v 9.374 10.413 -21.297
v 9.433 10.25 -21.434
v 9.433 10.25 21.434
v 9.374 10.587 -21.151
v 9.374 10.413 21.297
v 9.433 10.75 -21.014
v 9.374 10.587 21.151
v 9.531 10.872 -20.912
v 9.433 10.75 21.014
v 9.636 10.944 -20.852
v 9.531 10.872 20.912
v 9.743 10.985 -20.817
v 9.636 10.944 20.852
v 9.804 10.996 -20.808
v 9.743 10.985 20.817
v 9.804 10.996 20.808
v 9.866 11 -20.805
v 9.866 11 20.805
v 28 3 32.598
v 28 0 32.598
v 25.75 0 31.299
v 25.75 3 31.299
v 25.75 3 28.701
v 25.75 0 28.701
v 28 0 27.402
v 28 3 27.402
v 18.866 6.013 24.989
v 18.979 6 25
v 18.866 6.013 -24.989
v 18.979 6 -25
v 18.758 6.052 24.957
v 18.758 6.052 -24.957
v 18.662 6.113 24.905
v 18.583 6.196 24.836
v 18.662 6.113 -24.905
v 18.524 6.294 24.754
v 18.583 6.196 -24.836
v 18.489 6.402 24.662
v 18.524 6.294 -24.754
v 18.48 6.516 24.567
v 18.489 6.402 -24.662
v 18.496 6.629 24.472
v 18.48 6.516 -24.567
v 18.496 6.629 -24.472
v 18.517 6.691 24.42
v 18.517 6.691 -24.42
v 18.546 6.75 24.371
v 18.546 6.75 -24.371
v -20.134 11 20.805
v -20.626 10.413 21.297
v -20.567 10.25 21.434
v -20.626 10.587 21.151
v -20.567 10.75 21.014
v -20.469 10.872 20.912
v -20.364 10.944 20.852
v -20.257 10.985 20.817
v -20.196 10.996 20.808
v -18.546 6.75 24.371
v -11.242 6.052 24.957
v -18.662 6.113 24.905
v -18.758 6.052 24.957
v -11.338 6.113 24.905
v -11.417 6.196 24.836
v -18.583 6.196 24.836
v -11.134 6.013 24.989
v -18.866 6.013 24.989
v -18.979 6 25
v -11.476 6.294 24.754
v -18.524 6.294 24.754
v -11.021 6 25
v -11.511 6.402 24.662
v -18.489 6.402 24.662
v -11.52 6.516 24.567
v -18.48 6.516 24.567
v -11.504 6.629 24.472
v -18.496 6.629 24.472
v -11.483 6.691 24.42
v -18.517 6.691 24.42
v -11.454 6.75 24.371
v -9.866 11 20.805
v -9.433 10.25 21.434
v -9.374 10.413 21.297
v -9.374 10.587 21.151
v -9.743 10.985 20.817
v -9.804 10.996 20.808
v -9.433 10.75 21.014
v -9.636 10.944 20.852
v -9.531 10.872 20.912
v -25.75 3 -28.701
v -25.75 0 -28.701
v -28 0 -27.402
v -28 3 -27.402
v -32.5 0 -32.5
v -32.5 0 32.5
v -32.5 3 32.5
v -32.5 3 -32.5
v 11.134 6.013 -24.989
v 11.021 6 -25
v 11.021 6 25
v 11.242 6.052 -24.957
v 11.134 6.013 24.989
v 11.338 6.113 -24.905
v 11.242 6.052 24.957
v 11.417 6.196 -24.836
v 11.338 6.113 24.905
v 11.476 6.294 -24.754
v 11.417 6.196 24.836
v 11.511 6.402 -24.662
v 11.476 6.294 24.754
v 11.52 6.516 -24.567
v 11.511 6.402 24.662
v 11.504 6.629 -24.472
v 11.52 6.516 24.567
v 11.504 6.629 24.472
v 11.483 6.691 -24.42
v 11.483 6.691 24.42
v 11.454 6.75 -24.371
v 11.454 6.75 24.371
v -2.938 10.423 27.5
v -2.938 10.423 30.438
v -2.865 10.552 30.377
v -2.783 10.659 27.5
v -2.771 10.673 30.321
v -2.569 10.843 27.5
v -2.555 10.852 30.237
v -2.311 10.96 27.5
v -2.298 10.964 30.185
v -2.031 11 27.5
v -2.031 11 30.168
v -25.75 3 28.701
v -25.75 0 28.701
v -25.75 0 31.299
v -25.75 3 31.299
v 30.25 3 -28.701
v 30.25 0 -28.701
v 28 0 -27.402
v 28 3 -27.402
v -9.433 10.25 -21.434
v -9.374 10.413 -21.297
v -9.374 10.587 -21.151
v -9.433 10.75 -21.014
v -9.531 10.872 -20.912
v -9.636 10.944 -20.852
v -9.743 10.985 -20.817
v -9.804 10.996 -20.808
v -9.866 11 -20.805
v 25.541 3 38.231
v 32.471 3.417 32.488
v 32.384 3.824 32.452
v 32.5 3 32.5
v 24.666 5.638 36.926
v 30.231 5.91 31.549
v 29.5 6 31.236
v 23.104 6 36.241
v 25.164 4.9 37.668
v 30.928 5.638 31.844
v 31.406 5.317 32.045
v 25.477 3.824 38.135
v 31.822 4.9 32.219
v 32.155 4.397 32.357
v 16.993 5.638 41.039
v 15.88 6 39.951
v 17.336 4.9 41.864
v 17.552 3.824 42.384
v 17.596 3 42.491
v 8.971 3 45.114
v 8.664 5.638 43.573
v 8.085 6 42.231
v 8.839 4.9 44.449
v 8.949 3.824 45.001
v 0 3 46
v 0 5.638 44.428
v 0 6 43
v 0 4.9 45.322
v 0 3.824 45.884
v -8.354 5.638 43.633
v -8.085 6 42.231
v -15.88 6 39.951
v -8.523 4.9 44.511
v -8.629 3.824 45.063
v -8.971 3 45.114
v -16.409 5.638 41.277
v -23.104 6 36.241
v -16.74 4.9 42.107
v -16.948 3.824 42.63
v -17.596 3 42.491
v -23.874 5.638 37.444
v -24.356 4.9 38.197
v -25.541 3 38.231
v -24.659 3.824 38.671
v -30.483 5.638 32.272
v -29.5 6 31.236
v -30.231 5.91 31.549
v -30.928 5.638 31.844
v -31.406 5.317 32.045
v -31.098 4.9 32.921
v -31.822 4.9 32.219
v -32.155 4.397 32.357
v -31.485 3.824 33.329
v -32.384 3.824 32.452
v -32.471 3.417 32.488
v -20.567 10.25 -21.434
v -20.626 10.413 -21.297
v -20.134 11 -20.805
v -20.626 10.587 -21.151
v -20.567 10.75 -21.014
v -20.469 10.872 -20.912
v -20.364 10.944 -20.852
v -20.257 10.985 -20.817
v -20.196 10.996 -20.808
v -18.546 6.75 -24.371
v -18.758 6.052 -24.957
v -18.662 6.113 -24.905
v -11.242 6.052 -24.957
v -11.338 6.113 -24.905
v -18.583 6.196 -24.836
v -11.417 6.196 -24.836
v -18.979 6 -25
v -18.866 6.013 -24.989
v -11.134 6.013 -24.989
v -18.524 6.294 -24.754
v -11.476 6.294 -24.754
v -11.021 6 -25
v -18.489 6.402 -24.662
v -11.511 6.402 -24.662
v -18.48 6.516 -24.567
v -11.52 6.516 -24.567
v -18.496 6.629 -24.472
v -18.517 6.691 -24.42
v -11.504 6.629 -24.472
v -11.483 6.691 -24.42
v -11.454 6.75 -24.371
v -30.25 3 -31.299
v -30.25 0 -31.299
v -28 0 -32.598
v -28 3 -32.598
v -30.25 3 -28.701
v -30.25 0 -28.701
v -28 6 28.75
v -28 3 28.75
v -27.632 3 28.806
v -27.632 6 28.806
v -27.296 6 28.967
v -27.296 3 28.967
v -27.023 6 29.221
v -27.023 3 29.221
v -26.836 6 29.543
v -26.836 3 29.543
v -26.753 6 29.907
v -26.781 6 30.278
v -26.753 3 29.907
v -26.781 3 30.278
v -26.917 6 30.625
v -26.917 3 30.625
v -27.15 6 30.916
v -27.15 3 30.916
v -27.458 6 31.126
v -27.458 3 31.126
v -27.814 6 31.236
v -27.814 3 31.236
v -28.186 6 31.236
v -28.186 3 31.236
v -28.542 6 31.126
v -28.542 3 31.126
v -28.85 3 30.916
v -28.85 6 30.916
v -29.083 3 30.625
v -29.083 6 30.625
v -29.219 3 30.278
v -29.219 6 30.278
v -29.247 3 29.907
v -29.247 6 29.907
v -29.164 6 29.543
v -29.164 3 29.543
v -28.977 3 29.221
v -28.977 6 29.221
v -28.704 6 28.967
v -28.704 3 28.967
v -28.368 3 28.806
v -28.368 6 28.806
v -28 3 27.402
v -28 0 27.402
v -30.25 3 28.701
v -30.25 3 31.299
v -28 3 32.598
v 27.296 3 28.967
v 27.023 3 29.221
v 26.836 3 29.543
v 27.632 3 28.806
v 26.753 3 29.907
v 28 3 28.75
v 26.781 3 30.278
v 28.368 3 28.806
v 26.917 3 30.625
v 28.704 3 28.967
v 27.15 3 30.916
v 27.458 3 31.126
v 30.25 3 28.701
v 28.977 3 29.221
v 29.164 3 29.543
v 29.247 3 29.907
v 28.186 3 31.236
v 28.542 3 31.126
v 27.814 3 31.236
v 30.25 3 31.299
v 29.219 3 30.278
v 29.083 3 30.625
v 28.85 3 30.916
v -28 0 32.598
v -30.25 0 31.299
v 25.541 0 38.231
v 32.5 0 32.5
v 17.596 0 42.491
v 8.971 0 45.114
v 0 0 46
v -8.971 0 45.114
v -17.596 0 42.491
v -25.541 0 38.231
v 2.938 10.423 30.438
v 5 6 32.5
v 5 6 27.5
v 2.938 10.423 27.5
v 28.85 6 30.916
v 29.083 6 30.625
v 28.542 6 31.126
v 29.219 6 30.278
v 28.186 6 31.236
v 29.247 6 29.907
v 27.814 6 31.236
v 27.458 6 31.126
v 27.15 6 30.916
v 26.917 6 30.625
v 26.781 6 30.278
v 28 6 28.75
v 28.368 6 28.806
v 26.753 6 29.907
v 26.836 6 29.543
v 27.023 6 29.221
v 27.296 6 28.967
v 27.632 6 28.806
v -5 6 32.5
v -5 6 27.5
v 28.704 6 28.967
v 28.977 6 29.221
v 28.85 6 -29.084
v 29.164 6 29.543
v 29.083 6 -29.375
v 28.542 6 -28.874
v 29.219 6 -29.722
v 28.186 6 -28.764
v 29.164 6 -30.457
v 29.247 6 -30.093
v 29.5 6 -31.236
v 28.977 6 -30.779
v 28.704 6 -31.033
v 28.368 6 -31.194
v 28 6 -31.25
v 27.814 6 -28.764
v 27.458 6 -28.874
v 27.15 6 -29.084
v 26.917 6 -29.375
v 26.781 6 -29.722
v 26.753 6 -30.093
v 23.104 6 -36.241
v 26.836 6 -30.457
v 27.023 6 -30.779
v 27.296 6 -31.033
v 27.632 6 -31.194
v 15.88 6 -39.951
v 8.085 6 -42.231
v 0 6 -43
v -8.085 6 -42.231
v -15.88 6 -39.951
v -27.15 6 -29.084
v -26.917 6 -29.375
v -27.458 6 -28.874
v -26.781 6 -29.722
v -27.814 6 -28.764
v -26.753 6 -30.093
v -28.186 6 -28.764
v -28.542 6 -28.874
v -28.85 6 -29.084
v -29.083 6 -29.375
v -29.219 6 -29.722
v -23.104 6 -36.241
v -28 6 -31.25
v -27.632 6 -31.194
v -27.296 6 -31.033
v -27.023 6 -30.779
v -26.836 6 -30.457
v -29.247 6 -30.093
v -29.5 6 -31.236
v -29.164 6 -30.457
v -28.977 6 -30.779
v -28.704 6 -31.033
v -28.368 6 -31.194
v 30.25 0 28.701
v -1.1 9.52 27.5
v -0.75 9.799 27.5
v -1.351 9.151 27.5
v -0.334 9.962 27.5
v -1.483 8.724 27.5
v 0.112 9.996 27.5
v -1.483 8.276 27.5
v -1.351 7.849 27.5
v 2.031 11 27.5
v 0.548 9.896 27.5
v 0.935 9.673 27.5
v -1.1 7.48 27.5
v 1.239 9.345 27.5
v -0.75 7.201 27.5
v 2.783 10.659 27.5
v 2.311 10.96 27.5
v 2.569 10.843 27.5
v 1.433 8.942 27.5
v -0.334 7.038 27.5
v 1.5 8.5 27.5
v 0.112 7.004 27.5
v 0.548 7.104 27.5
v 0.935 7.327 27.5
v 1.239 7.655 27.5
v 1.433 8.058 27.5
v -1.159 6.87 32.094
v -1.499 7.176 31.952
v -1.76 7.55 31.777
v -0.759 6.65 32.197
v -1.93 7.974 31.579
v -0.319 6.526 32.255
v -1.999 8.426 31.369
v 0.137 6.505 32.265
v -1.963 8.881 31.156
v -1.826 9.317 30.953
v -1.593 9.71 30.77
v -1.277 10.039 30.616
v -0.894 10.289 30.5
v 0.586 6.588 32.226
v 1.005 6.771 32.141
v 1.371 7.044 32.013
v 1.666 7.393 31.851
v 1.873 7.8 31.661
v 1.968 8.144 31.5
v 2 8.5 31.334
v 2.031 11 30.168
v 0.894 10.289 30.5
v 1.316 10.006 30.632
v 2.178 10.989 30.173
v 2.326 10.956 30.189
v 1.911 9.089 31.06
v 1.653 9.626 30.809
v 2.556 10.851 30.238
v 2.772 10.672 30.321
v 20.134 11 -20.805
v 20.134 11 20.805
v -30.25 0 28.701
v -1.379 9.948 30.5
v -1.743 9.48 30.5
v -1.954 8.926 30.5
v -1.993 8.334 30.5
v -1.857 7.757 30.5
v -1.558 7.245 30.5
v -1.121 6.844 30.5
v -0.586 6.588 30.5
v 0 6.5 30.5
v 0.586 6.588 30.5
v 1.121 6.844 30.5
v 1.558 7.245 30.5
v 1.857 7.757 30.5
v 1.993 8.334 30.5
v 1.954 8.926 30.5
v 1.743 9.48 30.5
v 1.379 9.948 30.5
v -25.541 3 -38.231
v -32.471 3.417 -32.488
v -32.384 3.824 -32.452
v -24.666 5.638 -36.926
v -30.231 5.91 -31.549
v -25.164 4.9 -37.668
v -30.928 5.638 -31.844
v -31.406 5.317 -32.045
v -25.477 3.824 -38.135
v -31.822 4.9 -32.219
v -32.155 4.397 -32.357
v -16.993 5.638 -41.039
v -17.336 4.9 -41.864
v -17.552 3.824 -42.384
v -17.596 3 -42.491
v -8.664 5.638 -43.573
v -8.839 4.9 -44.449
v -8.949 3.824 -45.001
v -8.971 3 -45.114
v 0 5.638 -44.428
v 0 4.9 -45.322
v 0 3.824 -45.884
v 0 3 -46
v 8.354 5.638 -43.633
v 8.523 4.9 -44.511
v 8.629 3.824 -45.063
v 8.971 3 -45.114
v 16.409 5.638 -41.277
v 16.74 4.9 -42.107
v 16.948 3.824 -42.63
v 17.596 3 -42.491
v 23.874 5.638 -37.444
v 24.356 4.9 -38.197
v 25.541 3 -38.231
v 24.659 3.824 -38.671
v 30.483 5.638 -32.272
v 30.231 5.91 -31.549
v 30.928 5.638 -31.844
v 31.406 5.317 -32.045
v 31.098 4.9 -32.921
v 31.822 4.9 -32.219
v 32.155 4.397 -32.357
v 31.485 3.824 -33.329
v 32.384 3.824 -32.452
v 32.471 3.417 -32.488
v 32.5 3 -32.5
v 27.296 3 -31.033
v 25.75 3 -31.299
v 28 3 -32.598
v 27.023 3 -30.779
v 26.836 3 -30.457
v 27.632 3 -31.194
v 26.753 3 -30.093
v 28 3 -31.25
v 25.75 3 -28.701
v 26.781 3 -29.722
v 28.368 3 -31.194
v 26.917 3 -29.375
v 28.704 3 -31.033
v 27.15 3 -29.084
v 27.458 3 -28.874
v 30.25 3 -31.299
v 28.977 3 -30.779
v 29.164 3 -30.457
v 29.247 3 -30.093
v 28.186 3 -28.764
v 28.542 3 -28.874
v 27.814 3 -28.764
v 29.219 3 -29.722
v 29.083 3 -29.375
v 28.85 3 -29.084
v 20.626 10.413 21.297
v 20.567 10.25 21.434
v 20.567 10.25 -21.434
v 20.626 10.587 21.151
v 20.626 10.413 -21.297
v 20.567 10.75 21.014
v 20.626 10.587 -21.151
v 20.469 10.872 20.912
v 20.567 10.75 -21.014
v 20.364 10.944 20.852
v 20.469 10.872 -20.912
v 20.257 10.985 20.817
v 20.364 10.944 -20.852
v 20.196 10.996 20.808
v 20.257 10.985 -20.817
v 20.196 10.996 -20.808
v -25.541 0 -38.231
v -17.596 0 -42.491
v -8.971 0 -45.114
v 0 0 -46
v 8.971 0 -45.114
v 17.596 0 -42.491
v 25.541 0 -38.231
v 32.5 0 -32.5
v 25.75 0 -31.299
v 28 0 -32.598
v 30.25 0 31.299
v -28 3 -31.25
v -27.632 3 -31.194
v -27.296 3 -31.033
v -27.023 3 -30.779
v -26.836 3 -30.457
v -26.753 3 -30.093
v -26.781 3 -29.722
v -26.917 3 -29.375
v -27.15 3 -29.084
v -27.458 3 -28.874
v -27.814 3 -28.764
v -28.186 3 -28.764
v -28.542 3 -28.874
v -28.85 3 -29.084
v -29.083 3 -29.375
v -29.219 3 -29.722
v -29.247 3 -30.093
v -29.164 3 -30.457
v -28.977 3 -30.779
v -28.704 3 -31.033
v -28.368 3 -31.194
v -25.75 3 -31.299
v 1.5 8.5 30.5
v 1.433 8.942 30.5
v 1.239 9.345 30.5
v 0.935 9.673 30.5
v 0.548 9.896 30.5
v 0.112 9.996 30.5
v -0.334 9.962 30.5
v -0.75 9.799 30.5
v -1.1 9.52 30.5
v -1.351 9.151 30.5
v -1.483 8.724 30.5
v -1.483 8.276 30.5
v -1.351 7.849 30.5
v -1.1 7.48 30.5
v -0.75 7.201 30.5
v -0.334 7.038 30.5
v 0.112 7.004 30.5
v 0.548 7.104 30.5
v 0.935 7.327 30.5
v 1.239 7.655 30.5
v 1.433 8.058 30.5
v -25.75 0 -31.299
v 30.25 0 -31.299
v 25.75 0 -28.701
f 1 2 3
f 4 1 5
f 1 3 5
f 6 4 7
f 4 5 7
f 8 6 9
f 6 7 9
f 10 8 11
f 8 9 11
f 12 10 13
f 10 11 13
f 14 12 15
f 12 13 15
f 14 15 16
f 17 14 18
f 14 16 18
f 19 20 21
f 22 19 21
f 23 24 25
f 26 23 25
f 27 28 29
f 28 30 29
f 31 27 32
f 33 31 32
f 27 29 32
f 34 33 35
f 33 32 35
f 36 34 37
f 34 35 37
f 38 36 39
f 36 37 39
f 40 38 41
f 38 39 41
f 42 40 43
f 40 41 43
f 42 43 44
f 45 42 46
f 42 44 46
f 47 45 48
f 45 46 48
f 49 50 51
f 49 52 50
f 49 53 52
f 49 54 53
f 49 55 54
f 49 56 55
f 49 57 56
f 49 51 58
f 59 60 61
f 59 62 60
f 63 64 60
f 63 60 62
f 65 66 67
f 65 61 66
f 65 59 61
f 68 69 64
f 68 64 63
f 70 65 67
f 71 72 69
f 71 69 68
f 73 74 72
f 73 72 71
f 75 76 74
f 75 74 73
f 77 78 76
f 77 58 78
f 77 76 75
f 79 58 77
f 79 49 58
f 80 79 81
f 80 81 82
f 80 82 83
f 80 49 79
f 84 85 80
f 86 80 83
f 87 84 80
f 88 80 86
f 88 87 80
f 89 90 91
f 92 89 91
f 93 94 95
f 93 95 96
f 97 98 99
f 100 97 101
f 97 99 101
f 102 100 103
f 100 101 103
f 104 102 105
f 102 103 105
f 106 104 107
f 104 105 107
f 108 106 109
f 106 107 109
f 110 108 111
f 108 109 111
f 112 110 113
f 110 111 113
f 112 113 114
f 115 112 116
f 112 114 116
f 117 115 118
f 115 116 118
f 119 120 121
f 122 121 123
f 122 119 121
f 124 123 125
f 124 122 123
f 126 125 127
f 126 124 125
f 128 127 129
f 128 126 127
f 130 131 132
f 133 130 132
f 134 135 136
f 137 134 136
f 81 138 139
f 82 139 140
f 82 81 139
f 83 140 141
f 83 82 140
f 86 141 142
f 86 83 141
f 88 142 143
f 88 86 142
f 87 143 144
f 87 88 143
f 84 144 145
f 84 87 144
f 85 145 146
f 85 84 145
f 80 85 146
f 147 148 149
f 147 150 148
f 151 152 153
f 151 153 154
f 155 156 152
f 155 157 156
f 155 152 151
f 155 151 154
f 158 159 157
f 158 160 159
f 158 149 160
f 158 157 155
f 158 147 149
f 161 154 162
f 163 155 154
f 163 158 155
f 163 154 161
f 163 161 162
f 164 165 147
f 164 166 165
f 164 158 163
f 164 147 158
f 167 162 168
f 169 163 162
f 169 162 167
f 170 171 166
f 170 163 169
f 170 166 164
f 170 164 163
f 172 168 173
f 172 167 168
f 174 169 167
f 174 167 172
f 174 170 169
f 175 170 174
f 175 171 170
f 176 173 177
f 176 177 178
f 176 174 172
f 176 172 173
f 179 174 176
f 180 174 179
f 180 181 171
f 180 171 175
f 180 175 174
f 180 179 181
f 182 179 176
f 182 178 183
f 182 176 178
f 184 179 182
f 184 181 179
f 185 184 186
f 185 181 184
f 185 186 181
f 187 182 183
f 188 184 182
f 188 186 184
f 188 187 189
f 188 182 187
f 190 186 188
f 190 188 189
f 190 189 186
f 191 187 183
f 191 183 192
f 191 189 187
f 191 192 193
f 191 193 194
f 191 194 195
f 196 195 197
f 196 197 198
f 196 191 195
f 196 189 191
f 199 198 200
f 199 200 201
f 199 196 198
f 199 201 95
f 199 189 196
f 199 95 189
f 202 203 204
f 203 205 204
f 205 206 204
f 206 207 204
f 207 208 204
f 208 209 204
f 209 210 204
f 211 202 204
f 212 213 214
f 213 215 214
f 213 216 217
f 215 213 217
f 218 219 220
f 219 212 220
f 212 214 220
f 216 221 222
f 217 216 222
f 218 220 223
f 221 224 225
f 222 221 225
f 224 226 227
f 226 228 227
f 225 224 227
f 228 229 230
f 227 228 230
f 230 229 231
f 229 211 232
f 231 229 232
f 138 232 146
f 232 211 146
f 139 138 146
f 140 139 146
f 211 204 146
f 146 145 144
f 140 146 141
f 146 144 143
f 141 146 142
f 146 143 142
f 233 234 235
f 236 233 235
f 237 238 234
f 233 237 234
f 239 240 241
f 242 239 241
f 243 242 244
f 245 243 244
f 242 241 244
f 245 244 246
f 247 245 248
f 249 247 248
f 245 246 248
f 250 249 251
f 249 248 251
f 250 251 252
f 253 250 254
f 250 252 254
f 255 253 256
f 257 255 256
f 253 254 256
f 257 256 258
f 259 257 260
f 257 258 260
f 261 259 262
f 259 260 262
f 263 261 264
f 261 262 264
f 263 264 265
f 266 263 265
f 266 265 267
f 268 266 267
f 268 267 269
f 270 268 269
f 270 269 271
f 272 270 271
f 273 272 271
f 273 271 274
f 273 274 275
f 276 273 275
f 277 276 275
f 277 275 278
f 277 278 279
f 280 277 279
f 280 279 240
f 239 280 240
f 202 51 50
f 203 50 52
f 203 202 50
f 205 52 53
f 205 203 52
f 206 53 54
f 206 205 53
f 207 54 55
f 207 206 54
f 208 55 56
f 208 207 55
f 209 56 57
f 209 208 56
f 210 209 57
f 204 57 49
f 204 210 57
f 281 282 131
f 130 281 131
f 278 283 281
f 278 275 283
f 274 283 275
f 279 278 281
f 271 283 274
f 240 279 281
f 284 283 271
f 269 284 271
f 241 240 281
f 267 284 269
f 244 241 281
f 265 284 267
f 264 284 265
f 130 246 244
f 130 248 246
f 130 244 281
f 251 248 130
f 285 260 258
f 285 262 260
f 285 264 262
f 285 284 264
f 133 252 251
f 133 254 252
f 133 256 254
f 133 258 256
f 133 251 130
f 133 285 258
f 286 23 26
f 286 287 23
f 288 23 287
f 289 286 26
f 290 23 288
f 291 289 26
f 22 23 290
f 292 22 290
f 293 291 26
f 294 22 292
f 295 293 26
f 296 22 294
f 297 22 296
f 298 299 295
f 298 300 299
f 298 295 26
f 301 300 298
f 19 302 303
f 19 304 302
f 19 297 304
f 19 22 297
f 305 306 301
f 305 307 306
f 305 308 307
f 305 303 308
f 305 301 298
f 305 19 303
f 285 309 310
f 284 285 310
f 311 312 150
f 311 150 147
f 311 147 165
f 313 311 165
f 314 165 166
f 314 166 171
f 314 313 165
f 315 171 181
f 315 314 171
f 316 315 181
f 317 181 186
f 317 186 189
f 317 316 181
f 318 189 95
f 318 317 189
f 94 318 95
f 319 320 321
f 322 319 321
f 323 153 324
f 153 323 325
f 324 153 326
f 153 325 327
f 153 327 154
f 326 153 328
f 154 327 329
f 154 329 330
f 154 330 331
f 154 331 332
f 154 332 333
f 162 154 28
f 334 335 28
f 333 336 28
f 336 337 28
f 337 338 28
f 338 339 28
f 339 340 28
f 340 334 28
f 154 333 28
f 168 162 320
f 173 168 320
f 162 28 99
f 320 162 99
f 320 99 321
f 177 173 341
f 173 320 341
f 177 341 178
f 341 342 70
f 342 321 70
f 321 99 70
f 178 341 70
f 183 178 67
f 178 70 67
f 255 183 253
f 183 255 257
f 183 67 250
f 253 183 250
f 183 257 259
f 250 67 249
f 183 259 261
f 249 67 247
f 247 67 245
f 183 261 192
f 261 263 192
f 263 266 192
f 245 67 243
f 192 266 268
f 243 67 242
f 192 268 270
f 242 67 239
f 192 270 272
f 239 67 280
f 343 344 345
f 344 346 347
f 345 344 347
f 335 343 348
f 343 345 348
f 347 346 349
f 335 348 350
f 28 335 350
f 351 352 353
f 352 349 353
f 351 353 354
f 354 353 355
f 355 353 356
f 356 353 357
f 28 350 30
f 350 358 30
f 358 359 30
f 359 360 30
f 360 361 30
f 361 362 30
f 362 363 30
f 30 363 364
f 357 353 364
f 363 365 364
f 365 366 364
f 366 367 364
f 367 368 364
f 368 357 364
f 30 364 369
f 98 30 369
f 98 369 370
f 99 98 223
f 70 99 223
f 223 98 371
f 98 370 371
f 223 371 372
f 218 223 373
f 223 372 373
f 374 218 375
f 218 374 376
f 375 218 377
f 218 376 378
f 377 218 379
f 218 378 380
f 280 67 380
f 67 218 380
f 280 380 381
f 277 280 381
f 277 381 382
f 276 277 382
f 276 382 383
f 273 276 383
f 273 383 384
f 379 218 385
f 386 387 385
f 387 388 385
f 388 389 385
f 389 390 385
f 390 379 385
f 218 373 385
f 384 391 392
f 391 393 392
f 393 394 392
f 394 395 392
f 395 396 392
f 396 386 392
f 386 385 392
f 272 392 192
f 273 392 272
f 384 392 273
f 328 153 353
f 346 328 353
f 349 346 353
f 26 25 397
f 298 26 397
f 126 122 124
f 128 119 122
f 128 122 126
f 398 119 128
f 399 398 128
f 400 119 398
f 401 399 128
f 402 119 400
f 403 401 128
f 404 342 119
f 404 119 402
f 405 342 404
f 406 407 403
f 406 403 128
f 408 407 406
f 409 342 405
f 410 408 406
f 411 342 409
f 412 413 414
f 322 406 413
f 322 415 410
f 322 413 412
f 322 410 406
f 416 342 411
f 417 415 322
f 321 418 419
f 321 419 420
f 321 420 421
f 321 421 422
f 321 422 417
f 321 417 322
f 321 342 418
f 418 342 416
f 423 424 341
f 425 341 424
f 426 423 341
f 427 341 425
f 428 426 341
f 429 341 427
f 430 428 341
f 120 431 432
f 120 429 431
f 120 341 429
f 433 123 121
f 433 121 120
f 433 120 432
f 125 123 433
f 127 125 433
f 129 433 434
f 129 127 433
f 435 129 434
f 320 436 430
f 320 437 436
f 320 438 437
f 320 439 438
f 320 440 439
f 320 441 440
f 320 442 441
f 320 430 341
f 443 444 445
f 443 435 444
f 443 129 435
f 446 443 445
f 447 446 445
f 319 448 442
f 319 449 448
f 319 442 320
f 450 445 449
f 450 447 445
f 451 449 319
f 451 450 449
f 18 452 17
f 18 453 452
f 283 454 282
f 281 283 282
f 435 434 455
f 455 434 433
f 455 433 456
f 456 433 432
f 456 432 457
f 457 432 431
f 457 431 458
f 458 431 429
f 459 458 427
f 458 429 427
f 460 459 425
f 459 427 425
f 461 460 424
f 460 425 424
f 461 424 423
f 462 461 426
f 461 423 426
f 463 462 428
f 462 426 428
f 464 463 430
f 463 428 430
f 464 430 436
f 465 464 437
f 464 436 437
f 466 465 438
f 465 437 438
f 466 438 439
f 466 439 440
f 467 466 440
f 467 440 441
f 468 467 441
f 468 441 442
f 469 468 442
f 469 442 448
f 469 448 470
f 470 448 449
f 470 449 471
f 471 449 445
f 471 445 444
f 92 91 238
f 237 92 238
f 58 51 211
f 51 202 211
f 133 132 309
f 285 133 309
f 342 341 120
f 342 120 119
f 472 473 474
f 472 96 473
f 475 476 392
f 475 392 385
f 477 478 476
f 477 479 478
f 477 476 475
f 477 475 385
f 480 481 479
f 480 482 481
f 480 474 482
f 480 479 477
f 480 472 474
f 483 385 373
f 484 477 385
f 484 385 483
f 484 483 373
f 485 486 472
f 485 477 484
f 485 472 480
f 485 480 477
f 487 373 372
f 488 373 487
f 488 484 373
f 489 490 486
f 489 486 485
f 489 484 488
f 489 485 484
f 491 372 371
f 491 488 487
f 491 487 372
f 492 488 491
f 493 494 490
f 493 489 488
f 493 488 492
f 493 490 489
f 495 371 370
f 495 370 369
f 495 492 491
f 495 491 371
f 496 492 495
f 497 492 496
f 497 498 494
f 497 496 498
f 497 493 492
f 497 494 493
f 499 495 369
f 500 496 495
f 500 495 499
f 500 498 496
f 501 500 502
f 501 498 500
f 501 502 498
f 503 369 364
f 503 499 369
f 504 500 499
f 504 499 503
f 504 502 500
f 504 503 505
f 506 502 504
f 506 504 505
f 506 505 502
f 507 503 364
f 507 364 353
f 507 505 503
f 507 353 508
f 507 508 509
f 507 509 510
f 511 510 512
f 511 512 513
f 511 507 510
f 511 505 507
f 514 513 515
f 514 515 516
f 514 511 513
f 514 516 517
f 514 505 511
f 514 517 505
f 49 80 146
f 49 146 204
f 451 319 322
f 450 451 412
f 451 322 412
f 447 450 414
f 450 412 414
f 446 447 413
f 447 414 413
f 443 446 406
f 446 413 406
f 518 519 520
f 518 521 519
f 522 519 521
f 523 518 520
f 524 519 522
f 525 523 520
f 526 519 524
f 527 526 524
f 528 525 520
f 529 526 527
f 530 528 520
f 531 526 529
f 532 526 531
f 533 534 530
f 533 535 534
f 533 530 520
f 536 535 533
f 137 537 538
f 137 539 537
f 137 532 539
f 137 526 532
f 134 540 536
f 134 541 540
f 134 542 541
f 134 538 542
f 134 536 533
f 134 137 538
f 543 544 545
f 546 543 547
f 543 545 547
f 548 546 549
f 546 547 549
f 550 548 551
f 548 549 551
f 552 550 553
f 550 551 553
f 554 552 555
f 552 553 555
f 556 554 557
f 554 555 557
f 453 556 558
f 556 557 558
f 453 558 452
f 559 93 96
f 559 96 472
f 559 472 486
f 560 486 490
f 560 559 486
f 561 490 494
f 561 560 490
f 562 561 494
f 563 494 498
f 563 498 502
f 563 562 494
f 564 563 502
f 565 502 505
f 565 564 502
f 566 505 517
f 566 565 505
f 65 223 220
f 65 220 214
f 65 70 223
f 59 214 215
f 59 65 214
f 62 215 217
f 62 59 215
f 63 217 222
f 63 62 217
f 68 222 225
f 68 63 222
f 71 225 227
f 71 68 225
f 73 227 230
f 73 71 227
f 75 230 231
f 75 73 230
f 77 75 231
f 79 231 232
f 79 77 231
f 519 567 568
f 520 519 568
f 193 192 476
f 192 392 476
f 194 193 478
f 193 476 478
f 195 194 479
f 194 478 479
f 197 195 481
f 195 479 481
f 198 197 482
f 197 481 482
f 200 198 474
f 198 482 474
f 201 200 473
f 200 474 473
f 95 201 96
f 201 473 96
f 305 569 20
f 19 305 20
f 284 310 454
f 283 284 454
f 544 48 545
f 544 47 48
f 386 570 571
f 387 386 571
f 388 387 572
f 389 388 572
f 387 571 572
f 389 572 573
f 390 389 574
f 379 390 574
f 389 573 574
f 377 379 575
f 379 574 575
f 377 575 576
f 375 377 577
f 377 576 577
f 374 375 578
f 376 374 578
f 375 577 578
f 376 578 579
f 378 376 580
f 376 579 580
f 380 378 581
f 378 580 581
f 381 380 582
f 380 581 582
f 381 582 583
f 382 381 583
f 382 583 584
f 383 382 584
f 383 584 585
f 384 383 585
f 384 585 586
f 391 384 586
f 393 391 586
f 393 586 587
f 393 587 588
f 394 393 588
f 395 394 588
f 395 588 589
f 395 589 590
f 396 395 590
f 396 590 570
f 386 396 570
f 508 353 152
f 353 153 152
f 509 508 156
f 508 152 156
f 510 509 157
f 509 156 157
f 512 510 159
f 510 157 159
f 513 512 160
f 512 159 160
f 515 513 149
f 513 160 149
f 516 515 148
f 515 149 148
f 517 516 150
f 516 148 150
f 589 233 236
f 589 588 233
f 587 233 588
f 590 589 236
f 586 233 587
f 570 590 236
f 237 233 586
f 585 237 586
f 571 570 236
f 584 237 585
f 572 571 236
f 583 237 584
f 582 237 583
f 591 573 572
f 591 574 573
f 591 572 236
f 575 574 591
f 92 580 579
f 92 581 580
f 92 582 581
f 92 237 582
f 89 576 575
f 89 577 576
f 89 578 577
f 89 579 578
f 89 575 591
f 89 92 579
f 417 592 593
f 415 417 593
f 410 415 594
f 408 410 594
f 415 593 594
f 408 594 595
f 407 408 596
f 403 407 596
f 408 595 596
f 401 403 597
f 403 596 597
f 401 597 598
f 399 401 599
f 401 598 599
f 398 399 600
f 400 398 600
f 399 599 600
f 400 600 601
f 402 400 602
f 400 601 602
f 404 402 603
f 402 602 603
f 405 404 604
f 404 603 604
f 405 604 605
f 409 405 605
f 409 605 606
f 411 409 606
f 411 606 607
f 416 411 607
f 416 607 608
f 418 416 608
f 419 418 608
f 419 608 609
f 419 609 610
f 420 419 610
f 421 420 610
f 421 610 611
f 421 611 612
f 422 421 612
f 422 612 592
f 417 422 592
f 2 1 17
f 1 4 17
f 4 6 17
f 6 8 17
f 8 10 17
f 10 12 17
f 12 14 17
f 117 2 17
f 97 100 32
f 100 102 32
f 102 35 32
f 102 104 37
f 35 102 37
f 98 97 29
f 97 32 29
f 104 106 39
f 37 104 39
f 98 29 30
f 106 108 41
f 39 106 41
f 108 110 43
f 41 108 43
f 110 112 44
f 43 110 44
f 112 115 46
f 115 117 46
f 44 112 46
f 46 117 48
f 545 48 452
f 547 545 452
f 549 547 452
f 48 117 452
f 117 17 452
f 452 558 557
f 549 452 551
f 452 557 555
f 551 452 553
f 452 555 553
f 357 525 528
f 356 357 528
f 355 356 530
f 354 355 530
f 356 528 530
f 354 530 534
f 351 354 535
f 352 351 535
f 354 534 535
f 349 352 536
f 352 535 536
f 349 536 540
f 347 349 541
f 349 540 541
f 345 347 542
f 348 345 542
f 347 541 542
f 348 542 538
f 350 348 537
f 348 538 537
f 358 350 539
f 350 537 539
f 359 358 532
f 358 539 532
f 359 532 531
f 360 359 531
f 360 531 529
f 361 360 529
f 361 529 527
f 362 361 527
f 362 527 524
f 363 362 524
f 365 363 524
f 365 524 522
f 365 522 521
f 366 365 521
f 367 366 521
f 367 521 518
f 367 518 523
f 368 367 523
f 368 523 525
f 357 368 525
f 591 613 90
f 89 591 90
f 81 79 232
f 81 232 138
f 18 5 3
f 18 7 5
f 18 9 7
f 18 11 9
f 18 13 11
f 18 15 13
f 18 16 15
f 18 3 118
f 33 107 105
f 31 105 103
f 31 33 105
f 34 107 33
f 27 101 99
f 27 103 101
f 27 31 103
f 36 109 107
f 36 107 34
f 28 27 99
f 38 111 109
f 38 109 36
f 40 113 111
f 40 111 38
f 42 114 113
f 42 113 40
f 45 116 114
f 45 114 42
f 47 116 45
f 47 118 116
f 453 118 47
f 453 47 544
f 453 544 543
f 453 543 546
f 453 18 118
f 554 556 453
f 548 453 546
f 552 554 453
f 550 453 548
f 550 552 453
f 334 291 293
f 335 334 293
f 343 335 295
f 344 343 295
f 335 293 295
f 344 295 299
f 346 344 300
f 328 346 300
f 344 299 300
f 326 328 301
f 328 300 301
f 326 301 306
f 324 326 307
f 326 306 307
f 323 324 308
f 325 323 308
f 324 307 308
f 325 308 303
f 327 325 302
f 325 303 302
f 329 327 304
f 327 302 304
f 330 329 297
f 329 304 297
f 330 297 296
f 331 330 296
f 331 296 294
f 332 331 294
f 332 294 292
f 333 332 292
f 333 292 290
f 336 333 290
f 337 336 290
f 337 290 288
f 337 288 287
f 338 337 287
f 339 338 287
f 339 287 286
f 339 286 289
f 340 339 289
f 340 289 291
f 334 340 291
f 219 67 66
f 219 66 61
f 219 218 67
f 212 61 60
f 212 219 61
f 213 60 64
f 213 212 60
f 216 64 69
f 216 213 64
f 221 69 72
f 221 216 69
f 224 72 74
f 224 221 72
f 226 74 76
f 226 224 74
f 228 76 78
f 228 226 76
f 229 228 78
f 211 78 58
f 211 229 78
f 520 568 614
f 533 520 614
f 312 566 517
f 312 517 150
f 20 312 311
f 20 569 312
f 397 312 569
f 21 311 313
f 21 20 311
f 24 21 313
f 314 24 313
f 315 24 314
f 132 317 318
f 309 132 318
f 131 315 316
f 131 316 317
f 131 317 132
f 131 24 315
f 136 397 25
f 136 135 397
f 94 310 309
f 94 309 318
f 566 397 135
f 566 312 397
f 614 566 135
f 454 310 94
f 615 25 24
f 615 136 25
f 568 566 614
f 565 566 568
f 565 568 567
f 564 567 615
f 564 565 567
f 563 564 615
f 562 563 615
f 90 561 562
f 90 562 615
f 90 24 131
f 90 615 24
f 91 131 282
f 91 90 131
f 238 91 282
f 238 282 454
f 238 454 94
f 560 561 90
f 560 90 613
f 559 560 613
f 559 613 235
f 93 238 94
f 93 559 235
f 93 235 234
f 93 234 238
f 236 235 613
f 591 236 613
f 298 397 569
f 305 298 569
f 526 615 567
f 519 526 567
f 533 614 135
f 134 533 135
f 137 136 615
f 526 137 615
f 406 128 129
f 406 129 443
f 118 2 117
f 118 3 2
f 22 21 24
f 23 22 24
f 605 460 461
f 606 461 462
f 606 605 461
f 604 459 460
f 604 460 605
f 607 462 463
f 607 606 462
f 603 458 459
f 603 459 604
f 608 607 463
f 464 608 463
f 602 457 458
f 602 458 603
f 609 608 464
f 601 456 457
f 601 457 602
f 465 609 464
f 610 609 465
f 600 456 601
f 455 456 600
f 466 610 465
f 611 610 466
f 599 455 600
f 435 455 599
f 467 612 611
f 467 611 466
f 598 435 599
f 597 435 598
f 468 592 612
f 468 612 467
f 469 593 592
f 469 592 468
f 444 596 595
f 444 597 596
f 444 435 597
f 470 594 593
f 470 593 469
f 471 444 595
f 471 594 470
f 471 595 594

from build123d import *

# Parameters (mm, degrees)
EXTRUDE_1_DEPTH     = 6
CUT_EXTRUDE_1_DEPTH = 3
SKETCH_4_R          = 1.25
CUT_EXTRUDE_3_DEPTH = 57.402570863
EXTRUDE_2_DEPTH     = 25
DRAFT_1_ANGLE       = 40
FILLET_1_R          = 0.5
SKETCH_6_W          = 10
SKETCH_6_H          = 5
EXTRUDE_3_DEPTH     = 5
DRAFT_3_ANGLE       = 25
FILLET_2_R          = 1
SKETCH_7_R          = 1.5
CUT_EXTRUDE_4_DEPTH = 5
SKETCH_8_R          = 2
SKETCH_8_R_2        = 1.5
CUT_EXTRUDE_5_DEPTH = 2
DRAFT_START         = 31.990712649
DRAFT_5_DEPTH       = 3.009287351
FILLET_3_R          = 3


with BuildPart() as part:
    # Эскиз1 → Бобышка-Вытянуть1 (new body)
    with BuildSketch(Plane(origin=(0, 0, 0), x_dir=(1, 0, 0), z_dir=(0, 1, 0))):
        with BuildLine():
            Line((-32.5, -32.5), (-32.5, 32.5))
            ThreePointArc((-32.5, 32.5), (0, 46), (32.5, 32.5))
            Line((32.5, 32.5), (32.5, -32.5))
            ThreePointArc((32.5, -32.5), (0, -46), (-32.5, -32.5))
        make_face()
    extrude(amount=EXTRUDE_1_DEPTH)

    # Эскиз2 → Вырез-Вытянуть1 (cut)
    with BuildSketch(Plane.XZ):
        Polygon((28, -32.598076211), (30.25, -31.299038106), (30.25, -28.700961894), (28, -27.401923789), (25.75, -28.700961894), (25.75, -31.299038106), align=None)
        Polygon((25.75, 31.299038106), (25.75, 28.700961894), (28, 27.401923789), (30.25, 28.700961894), (30.25, 31.299038106), (28, 32.598076211), align=None)
        Polygon((-28, 27.401923789), (-25.75, 28.700961894), (-25.75, 31.299038106), (-28, 32.598076211), (-30.25, 31.299038106), (-30.25, 28.700961894), align=None)
        Polygon((-28, -32.598076211), (-25.75, -31.299038106), (-25.75, -28.700961894), (-28, -27.401923789), (-30.25, -28.700961894), (-30.25, -31.299038106), align=None)
    extrude(amount=-CUT_EXTRUDE_1_DEPTH, mode=Mode.SUBTRACT)

    # Эскиз4 → Вырез-Вытянуть3 (cut, through all)
    with BuildSketch(Plane.XZ.offset(-3)):
        with Locations(Location((28, 30, 0), (0, 0, 270))):
            Circle(SKETCH_4_R)
        with Locations(Location((-28, 30, 0), (0, 0, 270))):
            Circle(SKETCH_4_R)
        with Locations(Location((-28, -30, 0), (0, 0, 270))):
            Circle(SKETCH_4_R)
        with Locations(Location((28, -30, 0), (0, 0, 270))):
            Circle(SKETCH_4_R)
    extrude(amount=-CUT_EXTRUDE_3_DEPTH, mode=Mode.SUBTRACT)

    # Эскиз5 → Бобышка-Вытянуть2 (add, symmetric)
    with BuildSketch(Plane.XY):
        Polygon((-18.113248654, 6), (-11.886751346, 6), (-9, 11), (-21, 11), align=None)
        Polygon((21, 11), (9, 11), (11.886751346, 6), (18.113248654, 6), align=None)
    extrude(amount=EXTRUDE_2_DEPTH, both=True)

    # Уклон1
    draft_1_faces = [part.faces().sort_by_distance(p)[0] for p in [
        (15, 8.763970206, -25),
        (15, 8.763970206, 25),
        (-15, 8.763970206, -25),
        (-15, 8.763970206, 25),
    ]]
    draft(draft_1_faces, Plane.ZX.offset(6), DRAFT_1_ANGLE)

    # Скругление1
    fillet_1_edges = [part.edges().sort_by_distance(p)[0] for p in [
        (-9, 11, 0),
        (-21, 11, 0),
        (-18.113248654, 6, 0),
        (-11.886751346, 6, 0),
        (11.886751346, 6, 0),
        (18.113248654, 6, 0),
        (21, 11, 0),
        (9, 11, 0),
    ]]
    fillet(fillet_1_edges, radius=FILLET_1_R)

    # Эскиз6 → Бобышка-Вытянуть3 (add)
    with BuildSketch(Plane(origin=(0, 6, 0), x_dir=(1, 0, 0), z_dir=(0, 1, 0))):
        with Locations((0, -30)):
            Rectangle(SKETCH_6_W, SKETCH_6_H)
    extrude(amount=EXTRUDE_3_DEPTH)

    # Уклон3
    draft_3_faces = [part.faces().sort_by_distance(p)[0] for p in [
        (5, 8.5, 30),
        (-5, 8.5, 30),
    ]]
    draft(draft_3_faces, Plane.ZX.offset(6), DRAFT_3_ANGLE)

    # Скругление2
    fillet_2_edges = [part.edges().sort_by_distance(p)[0] for p in [
        (2.668461709, 11, 30),
        (-2.668461709, 11, 30),
    ]]
    fillet(fillet_2_edges, radius=FILLET_2_R)

    # Эскиз7 → Вырез-Вытянуть4 (cut)
    with BuildSketch(Plane.XY.offset(32.5)):
        with Locations((0, 8.5)):
            Circle(SKETCH_7_R)
    extrude(amount=-CUT_EXTRUDE_4_DEPTH, mode=Mode.SUBTRACT)

    # Эскиз8 → Вырез-Вытянуть5 (cut)
    with BuildSketch(Plane.XY.offset(32.5)):
        with Locations((0, 8.5)):
            Circle(SKETCH_8_R)
        with Locations((0, 8.5)):
            Circle(SKETCH_8_R_2, mode=Mode.SUBTRACT)
    extrude(amount=-CUT_EXTRUDE_5_DEPTH, mode=Mode.SUBTRACT)

    # Уклон5: read off the stored shape, not the designer's step
    # Уклон5 outline → Уклон5 (cut)
    with BuildSketch(Plane(origin=(0, 0, 0), x_dir=(1, 0, 0), z_dir=(0, 0.4226182617406999, 0.9063077870366498)).offset(DRAFT_START)):
        with BuildLine():
            Line((-5, -8.297246784), (5, -8.297246784))
            Line((5, -8.297246784), (2.937699235, -3.41742745))
            add(Edge.make_bspline(
                [(2.937699235, -3.41742745), (2.668461709, -2.78035719), (2.031391448, -2.78035719)],
                knots=[2.00712864, 2.00712864, 2.00712864, 3.141592654, 3.141592654, 3.141592654], degree=2, weights=[1, 0.843391446, 1]))
            Line((2.031391448, -2.78035719), (-2.031391448, -2.78035719))
            add(Edge.make_bspline(
                [(-2.031391448, -2.78035719), (-2.668461709, -2.78035719), (-2.937699235, -3.41742745)],
                knots=[0, 0, 0, 1.134464014, 1.134464014, 1.134464014], degree=2, weights=[1, 0.843391446, 1]))
            Line((-2.937699235, -3.41742745), (-5, -8.297246784))
        make_face()
    extrude(amount=DRAFT_5_DEPTH, mode=Mode.SUBTRACT)

    # Скругление3
    fillet_3_edges = [part.edges().sort_by_distance(p)[0] for p in [
        (0, 6, 46),
        (32.5, 6, 0),
        (0, 6, -46),
        (-32.5, 6, 0),
    ]]
    fillet(fillet_3_edges, radius=FILLET_3_R)


solid = part.part
